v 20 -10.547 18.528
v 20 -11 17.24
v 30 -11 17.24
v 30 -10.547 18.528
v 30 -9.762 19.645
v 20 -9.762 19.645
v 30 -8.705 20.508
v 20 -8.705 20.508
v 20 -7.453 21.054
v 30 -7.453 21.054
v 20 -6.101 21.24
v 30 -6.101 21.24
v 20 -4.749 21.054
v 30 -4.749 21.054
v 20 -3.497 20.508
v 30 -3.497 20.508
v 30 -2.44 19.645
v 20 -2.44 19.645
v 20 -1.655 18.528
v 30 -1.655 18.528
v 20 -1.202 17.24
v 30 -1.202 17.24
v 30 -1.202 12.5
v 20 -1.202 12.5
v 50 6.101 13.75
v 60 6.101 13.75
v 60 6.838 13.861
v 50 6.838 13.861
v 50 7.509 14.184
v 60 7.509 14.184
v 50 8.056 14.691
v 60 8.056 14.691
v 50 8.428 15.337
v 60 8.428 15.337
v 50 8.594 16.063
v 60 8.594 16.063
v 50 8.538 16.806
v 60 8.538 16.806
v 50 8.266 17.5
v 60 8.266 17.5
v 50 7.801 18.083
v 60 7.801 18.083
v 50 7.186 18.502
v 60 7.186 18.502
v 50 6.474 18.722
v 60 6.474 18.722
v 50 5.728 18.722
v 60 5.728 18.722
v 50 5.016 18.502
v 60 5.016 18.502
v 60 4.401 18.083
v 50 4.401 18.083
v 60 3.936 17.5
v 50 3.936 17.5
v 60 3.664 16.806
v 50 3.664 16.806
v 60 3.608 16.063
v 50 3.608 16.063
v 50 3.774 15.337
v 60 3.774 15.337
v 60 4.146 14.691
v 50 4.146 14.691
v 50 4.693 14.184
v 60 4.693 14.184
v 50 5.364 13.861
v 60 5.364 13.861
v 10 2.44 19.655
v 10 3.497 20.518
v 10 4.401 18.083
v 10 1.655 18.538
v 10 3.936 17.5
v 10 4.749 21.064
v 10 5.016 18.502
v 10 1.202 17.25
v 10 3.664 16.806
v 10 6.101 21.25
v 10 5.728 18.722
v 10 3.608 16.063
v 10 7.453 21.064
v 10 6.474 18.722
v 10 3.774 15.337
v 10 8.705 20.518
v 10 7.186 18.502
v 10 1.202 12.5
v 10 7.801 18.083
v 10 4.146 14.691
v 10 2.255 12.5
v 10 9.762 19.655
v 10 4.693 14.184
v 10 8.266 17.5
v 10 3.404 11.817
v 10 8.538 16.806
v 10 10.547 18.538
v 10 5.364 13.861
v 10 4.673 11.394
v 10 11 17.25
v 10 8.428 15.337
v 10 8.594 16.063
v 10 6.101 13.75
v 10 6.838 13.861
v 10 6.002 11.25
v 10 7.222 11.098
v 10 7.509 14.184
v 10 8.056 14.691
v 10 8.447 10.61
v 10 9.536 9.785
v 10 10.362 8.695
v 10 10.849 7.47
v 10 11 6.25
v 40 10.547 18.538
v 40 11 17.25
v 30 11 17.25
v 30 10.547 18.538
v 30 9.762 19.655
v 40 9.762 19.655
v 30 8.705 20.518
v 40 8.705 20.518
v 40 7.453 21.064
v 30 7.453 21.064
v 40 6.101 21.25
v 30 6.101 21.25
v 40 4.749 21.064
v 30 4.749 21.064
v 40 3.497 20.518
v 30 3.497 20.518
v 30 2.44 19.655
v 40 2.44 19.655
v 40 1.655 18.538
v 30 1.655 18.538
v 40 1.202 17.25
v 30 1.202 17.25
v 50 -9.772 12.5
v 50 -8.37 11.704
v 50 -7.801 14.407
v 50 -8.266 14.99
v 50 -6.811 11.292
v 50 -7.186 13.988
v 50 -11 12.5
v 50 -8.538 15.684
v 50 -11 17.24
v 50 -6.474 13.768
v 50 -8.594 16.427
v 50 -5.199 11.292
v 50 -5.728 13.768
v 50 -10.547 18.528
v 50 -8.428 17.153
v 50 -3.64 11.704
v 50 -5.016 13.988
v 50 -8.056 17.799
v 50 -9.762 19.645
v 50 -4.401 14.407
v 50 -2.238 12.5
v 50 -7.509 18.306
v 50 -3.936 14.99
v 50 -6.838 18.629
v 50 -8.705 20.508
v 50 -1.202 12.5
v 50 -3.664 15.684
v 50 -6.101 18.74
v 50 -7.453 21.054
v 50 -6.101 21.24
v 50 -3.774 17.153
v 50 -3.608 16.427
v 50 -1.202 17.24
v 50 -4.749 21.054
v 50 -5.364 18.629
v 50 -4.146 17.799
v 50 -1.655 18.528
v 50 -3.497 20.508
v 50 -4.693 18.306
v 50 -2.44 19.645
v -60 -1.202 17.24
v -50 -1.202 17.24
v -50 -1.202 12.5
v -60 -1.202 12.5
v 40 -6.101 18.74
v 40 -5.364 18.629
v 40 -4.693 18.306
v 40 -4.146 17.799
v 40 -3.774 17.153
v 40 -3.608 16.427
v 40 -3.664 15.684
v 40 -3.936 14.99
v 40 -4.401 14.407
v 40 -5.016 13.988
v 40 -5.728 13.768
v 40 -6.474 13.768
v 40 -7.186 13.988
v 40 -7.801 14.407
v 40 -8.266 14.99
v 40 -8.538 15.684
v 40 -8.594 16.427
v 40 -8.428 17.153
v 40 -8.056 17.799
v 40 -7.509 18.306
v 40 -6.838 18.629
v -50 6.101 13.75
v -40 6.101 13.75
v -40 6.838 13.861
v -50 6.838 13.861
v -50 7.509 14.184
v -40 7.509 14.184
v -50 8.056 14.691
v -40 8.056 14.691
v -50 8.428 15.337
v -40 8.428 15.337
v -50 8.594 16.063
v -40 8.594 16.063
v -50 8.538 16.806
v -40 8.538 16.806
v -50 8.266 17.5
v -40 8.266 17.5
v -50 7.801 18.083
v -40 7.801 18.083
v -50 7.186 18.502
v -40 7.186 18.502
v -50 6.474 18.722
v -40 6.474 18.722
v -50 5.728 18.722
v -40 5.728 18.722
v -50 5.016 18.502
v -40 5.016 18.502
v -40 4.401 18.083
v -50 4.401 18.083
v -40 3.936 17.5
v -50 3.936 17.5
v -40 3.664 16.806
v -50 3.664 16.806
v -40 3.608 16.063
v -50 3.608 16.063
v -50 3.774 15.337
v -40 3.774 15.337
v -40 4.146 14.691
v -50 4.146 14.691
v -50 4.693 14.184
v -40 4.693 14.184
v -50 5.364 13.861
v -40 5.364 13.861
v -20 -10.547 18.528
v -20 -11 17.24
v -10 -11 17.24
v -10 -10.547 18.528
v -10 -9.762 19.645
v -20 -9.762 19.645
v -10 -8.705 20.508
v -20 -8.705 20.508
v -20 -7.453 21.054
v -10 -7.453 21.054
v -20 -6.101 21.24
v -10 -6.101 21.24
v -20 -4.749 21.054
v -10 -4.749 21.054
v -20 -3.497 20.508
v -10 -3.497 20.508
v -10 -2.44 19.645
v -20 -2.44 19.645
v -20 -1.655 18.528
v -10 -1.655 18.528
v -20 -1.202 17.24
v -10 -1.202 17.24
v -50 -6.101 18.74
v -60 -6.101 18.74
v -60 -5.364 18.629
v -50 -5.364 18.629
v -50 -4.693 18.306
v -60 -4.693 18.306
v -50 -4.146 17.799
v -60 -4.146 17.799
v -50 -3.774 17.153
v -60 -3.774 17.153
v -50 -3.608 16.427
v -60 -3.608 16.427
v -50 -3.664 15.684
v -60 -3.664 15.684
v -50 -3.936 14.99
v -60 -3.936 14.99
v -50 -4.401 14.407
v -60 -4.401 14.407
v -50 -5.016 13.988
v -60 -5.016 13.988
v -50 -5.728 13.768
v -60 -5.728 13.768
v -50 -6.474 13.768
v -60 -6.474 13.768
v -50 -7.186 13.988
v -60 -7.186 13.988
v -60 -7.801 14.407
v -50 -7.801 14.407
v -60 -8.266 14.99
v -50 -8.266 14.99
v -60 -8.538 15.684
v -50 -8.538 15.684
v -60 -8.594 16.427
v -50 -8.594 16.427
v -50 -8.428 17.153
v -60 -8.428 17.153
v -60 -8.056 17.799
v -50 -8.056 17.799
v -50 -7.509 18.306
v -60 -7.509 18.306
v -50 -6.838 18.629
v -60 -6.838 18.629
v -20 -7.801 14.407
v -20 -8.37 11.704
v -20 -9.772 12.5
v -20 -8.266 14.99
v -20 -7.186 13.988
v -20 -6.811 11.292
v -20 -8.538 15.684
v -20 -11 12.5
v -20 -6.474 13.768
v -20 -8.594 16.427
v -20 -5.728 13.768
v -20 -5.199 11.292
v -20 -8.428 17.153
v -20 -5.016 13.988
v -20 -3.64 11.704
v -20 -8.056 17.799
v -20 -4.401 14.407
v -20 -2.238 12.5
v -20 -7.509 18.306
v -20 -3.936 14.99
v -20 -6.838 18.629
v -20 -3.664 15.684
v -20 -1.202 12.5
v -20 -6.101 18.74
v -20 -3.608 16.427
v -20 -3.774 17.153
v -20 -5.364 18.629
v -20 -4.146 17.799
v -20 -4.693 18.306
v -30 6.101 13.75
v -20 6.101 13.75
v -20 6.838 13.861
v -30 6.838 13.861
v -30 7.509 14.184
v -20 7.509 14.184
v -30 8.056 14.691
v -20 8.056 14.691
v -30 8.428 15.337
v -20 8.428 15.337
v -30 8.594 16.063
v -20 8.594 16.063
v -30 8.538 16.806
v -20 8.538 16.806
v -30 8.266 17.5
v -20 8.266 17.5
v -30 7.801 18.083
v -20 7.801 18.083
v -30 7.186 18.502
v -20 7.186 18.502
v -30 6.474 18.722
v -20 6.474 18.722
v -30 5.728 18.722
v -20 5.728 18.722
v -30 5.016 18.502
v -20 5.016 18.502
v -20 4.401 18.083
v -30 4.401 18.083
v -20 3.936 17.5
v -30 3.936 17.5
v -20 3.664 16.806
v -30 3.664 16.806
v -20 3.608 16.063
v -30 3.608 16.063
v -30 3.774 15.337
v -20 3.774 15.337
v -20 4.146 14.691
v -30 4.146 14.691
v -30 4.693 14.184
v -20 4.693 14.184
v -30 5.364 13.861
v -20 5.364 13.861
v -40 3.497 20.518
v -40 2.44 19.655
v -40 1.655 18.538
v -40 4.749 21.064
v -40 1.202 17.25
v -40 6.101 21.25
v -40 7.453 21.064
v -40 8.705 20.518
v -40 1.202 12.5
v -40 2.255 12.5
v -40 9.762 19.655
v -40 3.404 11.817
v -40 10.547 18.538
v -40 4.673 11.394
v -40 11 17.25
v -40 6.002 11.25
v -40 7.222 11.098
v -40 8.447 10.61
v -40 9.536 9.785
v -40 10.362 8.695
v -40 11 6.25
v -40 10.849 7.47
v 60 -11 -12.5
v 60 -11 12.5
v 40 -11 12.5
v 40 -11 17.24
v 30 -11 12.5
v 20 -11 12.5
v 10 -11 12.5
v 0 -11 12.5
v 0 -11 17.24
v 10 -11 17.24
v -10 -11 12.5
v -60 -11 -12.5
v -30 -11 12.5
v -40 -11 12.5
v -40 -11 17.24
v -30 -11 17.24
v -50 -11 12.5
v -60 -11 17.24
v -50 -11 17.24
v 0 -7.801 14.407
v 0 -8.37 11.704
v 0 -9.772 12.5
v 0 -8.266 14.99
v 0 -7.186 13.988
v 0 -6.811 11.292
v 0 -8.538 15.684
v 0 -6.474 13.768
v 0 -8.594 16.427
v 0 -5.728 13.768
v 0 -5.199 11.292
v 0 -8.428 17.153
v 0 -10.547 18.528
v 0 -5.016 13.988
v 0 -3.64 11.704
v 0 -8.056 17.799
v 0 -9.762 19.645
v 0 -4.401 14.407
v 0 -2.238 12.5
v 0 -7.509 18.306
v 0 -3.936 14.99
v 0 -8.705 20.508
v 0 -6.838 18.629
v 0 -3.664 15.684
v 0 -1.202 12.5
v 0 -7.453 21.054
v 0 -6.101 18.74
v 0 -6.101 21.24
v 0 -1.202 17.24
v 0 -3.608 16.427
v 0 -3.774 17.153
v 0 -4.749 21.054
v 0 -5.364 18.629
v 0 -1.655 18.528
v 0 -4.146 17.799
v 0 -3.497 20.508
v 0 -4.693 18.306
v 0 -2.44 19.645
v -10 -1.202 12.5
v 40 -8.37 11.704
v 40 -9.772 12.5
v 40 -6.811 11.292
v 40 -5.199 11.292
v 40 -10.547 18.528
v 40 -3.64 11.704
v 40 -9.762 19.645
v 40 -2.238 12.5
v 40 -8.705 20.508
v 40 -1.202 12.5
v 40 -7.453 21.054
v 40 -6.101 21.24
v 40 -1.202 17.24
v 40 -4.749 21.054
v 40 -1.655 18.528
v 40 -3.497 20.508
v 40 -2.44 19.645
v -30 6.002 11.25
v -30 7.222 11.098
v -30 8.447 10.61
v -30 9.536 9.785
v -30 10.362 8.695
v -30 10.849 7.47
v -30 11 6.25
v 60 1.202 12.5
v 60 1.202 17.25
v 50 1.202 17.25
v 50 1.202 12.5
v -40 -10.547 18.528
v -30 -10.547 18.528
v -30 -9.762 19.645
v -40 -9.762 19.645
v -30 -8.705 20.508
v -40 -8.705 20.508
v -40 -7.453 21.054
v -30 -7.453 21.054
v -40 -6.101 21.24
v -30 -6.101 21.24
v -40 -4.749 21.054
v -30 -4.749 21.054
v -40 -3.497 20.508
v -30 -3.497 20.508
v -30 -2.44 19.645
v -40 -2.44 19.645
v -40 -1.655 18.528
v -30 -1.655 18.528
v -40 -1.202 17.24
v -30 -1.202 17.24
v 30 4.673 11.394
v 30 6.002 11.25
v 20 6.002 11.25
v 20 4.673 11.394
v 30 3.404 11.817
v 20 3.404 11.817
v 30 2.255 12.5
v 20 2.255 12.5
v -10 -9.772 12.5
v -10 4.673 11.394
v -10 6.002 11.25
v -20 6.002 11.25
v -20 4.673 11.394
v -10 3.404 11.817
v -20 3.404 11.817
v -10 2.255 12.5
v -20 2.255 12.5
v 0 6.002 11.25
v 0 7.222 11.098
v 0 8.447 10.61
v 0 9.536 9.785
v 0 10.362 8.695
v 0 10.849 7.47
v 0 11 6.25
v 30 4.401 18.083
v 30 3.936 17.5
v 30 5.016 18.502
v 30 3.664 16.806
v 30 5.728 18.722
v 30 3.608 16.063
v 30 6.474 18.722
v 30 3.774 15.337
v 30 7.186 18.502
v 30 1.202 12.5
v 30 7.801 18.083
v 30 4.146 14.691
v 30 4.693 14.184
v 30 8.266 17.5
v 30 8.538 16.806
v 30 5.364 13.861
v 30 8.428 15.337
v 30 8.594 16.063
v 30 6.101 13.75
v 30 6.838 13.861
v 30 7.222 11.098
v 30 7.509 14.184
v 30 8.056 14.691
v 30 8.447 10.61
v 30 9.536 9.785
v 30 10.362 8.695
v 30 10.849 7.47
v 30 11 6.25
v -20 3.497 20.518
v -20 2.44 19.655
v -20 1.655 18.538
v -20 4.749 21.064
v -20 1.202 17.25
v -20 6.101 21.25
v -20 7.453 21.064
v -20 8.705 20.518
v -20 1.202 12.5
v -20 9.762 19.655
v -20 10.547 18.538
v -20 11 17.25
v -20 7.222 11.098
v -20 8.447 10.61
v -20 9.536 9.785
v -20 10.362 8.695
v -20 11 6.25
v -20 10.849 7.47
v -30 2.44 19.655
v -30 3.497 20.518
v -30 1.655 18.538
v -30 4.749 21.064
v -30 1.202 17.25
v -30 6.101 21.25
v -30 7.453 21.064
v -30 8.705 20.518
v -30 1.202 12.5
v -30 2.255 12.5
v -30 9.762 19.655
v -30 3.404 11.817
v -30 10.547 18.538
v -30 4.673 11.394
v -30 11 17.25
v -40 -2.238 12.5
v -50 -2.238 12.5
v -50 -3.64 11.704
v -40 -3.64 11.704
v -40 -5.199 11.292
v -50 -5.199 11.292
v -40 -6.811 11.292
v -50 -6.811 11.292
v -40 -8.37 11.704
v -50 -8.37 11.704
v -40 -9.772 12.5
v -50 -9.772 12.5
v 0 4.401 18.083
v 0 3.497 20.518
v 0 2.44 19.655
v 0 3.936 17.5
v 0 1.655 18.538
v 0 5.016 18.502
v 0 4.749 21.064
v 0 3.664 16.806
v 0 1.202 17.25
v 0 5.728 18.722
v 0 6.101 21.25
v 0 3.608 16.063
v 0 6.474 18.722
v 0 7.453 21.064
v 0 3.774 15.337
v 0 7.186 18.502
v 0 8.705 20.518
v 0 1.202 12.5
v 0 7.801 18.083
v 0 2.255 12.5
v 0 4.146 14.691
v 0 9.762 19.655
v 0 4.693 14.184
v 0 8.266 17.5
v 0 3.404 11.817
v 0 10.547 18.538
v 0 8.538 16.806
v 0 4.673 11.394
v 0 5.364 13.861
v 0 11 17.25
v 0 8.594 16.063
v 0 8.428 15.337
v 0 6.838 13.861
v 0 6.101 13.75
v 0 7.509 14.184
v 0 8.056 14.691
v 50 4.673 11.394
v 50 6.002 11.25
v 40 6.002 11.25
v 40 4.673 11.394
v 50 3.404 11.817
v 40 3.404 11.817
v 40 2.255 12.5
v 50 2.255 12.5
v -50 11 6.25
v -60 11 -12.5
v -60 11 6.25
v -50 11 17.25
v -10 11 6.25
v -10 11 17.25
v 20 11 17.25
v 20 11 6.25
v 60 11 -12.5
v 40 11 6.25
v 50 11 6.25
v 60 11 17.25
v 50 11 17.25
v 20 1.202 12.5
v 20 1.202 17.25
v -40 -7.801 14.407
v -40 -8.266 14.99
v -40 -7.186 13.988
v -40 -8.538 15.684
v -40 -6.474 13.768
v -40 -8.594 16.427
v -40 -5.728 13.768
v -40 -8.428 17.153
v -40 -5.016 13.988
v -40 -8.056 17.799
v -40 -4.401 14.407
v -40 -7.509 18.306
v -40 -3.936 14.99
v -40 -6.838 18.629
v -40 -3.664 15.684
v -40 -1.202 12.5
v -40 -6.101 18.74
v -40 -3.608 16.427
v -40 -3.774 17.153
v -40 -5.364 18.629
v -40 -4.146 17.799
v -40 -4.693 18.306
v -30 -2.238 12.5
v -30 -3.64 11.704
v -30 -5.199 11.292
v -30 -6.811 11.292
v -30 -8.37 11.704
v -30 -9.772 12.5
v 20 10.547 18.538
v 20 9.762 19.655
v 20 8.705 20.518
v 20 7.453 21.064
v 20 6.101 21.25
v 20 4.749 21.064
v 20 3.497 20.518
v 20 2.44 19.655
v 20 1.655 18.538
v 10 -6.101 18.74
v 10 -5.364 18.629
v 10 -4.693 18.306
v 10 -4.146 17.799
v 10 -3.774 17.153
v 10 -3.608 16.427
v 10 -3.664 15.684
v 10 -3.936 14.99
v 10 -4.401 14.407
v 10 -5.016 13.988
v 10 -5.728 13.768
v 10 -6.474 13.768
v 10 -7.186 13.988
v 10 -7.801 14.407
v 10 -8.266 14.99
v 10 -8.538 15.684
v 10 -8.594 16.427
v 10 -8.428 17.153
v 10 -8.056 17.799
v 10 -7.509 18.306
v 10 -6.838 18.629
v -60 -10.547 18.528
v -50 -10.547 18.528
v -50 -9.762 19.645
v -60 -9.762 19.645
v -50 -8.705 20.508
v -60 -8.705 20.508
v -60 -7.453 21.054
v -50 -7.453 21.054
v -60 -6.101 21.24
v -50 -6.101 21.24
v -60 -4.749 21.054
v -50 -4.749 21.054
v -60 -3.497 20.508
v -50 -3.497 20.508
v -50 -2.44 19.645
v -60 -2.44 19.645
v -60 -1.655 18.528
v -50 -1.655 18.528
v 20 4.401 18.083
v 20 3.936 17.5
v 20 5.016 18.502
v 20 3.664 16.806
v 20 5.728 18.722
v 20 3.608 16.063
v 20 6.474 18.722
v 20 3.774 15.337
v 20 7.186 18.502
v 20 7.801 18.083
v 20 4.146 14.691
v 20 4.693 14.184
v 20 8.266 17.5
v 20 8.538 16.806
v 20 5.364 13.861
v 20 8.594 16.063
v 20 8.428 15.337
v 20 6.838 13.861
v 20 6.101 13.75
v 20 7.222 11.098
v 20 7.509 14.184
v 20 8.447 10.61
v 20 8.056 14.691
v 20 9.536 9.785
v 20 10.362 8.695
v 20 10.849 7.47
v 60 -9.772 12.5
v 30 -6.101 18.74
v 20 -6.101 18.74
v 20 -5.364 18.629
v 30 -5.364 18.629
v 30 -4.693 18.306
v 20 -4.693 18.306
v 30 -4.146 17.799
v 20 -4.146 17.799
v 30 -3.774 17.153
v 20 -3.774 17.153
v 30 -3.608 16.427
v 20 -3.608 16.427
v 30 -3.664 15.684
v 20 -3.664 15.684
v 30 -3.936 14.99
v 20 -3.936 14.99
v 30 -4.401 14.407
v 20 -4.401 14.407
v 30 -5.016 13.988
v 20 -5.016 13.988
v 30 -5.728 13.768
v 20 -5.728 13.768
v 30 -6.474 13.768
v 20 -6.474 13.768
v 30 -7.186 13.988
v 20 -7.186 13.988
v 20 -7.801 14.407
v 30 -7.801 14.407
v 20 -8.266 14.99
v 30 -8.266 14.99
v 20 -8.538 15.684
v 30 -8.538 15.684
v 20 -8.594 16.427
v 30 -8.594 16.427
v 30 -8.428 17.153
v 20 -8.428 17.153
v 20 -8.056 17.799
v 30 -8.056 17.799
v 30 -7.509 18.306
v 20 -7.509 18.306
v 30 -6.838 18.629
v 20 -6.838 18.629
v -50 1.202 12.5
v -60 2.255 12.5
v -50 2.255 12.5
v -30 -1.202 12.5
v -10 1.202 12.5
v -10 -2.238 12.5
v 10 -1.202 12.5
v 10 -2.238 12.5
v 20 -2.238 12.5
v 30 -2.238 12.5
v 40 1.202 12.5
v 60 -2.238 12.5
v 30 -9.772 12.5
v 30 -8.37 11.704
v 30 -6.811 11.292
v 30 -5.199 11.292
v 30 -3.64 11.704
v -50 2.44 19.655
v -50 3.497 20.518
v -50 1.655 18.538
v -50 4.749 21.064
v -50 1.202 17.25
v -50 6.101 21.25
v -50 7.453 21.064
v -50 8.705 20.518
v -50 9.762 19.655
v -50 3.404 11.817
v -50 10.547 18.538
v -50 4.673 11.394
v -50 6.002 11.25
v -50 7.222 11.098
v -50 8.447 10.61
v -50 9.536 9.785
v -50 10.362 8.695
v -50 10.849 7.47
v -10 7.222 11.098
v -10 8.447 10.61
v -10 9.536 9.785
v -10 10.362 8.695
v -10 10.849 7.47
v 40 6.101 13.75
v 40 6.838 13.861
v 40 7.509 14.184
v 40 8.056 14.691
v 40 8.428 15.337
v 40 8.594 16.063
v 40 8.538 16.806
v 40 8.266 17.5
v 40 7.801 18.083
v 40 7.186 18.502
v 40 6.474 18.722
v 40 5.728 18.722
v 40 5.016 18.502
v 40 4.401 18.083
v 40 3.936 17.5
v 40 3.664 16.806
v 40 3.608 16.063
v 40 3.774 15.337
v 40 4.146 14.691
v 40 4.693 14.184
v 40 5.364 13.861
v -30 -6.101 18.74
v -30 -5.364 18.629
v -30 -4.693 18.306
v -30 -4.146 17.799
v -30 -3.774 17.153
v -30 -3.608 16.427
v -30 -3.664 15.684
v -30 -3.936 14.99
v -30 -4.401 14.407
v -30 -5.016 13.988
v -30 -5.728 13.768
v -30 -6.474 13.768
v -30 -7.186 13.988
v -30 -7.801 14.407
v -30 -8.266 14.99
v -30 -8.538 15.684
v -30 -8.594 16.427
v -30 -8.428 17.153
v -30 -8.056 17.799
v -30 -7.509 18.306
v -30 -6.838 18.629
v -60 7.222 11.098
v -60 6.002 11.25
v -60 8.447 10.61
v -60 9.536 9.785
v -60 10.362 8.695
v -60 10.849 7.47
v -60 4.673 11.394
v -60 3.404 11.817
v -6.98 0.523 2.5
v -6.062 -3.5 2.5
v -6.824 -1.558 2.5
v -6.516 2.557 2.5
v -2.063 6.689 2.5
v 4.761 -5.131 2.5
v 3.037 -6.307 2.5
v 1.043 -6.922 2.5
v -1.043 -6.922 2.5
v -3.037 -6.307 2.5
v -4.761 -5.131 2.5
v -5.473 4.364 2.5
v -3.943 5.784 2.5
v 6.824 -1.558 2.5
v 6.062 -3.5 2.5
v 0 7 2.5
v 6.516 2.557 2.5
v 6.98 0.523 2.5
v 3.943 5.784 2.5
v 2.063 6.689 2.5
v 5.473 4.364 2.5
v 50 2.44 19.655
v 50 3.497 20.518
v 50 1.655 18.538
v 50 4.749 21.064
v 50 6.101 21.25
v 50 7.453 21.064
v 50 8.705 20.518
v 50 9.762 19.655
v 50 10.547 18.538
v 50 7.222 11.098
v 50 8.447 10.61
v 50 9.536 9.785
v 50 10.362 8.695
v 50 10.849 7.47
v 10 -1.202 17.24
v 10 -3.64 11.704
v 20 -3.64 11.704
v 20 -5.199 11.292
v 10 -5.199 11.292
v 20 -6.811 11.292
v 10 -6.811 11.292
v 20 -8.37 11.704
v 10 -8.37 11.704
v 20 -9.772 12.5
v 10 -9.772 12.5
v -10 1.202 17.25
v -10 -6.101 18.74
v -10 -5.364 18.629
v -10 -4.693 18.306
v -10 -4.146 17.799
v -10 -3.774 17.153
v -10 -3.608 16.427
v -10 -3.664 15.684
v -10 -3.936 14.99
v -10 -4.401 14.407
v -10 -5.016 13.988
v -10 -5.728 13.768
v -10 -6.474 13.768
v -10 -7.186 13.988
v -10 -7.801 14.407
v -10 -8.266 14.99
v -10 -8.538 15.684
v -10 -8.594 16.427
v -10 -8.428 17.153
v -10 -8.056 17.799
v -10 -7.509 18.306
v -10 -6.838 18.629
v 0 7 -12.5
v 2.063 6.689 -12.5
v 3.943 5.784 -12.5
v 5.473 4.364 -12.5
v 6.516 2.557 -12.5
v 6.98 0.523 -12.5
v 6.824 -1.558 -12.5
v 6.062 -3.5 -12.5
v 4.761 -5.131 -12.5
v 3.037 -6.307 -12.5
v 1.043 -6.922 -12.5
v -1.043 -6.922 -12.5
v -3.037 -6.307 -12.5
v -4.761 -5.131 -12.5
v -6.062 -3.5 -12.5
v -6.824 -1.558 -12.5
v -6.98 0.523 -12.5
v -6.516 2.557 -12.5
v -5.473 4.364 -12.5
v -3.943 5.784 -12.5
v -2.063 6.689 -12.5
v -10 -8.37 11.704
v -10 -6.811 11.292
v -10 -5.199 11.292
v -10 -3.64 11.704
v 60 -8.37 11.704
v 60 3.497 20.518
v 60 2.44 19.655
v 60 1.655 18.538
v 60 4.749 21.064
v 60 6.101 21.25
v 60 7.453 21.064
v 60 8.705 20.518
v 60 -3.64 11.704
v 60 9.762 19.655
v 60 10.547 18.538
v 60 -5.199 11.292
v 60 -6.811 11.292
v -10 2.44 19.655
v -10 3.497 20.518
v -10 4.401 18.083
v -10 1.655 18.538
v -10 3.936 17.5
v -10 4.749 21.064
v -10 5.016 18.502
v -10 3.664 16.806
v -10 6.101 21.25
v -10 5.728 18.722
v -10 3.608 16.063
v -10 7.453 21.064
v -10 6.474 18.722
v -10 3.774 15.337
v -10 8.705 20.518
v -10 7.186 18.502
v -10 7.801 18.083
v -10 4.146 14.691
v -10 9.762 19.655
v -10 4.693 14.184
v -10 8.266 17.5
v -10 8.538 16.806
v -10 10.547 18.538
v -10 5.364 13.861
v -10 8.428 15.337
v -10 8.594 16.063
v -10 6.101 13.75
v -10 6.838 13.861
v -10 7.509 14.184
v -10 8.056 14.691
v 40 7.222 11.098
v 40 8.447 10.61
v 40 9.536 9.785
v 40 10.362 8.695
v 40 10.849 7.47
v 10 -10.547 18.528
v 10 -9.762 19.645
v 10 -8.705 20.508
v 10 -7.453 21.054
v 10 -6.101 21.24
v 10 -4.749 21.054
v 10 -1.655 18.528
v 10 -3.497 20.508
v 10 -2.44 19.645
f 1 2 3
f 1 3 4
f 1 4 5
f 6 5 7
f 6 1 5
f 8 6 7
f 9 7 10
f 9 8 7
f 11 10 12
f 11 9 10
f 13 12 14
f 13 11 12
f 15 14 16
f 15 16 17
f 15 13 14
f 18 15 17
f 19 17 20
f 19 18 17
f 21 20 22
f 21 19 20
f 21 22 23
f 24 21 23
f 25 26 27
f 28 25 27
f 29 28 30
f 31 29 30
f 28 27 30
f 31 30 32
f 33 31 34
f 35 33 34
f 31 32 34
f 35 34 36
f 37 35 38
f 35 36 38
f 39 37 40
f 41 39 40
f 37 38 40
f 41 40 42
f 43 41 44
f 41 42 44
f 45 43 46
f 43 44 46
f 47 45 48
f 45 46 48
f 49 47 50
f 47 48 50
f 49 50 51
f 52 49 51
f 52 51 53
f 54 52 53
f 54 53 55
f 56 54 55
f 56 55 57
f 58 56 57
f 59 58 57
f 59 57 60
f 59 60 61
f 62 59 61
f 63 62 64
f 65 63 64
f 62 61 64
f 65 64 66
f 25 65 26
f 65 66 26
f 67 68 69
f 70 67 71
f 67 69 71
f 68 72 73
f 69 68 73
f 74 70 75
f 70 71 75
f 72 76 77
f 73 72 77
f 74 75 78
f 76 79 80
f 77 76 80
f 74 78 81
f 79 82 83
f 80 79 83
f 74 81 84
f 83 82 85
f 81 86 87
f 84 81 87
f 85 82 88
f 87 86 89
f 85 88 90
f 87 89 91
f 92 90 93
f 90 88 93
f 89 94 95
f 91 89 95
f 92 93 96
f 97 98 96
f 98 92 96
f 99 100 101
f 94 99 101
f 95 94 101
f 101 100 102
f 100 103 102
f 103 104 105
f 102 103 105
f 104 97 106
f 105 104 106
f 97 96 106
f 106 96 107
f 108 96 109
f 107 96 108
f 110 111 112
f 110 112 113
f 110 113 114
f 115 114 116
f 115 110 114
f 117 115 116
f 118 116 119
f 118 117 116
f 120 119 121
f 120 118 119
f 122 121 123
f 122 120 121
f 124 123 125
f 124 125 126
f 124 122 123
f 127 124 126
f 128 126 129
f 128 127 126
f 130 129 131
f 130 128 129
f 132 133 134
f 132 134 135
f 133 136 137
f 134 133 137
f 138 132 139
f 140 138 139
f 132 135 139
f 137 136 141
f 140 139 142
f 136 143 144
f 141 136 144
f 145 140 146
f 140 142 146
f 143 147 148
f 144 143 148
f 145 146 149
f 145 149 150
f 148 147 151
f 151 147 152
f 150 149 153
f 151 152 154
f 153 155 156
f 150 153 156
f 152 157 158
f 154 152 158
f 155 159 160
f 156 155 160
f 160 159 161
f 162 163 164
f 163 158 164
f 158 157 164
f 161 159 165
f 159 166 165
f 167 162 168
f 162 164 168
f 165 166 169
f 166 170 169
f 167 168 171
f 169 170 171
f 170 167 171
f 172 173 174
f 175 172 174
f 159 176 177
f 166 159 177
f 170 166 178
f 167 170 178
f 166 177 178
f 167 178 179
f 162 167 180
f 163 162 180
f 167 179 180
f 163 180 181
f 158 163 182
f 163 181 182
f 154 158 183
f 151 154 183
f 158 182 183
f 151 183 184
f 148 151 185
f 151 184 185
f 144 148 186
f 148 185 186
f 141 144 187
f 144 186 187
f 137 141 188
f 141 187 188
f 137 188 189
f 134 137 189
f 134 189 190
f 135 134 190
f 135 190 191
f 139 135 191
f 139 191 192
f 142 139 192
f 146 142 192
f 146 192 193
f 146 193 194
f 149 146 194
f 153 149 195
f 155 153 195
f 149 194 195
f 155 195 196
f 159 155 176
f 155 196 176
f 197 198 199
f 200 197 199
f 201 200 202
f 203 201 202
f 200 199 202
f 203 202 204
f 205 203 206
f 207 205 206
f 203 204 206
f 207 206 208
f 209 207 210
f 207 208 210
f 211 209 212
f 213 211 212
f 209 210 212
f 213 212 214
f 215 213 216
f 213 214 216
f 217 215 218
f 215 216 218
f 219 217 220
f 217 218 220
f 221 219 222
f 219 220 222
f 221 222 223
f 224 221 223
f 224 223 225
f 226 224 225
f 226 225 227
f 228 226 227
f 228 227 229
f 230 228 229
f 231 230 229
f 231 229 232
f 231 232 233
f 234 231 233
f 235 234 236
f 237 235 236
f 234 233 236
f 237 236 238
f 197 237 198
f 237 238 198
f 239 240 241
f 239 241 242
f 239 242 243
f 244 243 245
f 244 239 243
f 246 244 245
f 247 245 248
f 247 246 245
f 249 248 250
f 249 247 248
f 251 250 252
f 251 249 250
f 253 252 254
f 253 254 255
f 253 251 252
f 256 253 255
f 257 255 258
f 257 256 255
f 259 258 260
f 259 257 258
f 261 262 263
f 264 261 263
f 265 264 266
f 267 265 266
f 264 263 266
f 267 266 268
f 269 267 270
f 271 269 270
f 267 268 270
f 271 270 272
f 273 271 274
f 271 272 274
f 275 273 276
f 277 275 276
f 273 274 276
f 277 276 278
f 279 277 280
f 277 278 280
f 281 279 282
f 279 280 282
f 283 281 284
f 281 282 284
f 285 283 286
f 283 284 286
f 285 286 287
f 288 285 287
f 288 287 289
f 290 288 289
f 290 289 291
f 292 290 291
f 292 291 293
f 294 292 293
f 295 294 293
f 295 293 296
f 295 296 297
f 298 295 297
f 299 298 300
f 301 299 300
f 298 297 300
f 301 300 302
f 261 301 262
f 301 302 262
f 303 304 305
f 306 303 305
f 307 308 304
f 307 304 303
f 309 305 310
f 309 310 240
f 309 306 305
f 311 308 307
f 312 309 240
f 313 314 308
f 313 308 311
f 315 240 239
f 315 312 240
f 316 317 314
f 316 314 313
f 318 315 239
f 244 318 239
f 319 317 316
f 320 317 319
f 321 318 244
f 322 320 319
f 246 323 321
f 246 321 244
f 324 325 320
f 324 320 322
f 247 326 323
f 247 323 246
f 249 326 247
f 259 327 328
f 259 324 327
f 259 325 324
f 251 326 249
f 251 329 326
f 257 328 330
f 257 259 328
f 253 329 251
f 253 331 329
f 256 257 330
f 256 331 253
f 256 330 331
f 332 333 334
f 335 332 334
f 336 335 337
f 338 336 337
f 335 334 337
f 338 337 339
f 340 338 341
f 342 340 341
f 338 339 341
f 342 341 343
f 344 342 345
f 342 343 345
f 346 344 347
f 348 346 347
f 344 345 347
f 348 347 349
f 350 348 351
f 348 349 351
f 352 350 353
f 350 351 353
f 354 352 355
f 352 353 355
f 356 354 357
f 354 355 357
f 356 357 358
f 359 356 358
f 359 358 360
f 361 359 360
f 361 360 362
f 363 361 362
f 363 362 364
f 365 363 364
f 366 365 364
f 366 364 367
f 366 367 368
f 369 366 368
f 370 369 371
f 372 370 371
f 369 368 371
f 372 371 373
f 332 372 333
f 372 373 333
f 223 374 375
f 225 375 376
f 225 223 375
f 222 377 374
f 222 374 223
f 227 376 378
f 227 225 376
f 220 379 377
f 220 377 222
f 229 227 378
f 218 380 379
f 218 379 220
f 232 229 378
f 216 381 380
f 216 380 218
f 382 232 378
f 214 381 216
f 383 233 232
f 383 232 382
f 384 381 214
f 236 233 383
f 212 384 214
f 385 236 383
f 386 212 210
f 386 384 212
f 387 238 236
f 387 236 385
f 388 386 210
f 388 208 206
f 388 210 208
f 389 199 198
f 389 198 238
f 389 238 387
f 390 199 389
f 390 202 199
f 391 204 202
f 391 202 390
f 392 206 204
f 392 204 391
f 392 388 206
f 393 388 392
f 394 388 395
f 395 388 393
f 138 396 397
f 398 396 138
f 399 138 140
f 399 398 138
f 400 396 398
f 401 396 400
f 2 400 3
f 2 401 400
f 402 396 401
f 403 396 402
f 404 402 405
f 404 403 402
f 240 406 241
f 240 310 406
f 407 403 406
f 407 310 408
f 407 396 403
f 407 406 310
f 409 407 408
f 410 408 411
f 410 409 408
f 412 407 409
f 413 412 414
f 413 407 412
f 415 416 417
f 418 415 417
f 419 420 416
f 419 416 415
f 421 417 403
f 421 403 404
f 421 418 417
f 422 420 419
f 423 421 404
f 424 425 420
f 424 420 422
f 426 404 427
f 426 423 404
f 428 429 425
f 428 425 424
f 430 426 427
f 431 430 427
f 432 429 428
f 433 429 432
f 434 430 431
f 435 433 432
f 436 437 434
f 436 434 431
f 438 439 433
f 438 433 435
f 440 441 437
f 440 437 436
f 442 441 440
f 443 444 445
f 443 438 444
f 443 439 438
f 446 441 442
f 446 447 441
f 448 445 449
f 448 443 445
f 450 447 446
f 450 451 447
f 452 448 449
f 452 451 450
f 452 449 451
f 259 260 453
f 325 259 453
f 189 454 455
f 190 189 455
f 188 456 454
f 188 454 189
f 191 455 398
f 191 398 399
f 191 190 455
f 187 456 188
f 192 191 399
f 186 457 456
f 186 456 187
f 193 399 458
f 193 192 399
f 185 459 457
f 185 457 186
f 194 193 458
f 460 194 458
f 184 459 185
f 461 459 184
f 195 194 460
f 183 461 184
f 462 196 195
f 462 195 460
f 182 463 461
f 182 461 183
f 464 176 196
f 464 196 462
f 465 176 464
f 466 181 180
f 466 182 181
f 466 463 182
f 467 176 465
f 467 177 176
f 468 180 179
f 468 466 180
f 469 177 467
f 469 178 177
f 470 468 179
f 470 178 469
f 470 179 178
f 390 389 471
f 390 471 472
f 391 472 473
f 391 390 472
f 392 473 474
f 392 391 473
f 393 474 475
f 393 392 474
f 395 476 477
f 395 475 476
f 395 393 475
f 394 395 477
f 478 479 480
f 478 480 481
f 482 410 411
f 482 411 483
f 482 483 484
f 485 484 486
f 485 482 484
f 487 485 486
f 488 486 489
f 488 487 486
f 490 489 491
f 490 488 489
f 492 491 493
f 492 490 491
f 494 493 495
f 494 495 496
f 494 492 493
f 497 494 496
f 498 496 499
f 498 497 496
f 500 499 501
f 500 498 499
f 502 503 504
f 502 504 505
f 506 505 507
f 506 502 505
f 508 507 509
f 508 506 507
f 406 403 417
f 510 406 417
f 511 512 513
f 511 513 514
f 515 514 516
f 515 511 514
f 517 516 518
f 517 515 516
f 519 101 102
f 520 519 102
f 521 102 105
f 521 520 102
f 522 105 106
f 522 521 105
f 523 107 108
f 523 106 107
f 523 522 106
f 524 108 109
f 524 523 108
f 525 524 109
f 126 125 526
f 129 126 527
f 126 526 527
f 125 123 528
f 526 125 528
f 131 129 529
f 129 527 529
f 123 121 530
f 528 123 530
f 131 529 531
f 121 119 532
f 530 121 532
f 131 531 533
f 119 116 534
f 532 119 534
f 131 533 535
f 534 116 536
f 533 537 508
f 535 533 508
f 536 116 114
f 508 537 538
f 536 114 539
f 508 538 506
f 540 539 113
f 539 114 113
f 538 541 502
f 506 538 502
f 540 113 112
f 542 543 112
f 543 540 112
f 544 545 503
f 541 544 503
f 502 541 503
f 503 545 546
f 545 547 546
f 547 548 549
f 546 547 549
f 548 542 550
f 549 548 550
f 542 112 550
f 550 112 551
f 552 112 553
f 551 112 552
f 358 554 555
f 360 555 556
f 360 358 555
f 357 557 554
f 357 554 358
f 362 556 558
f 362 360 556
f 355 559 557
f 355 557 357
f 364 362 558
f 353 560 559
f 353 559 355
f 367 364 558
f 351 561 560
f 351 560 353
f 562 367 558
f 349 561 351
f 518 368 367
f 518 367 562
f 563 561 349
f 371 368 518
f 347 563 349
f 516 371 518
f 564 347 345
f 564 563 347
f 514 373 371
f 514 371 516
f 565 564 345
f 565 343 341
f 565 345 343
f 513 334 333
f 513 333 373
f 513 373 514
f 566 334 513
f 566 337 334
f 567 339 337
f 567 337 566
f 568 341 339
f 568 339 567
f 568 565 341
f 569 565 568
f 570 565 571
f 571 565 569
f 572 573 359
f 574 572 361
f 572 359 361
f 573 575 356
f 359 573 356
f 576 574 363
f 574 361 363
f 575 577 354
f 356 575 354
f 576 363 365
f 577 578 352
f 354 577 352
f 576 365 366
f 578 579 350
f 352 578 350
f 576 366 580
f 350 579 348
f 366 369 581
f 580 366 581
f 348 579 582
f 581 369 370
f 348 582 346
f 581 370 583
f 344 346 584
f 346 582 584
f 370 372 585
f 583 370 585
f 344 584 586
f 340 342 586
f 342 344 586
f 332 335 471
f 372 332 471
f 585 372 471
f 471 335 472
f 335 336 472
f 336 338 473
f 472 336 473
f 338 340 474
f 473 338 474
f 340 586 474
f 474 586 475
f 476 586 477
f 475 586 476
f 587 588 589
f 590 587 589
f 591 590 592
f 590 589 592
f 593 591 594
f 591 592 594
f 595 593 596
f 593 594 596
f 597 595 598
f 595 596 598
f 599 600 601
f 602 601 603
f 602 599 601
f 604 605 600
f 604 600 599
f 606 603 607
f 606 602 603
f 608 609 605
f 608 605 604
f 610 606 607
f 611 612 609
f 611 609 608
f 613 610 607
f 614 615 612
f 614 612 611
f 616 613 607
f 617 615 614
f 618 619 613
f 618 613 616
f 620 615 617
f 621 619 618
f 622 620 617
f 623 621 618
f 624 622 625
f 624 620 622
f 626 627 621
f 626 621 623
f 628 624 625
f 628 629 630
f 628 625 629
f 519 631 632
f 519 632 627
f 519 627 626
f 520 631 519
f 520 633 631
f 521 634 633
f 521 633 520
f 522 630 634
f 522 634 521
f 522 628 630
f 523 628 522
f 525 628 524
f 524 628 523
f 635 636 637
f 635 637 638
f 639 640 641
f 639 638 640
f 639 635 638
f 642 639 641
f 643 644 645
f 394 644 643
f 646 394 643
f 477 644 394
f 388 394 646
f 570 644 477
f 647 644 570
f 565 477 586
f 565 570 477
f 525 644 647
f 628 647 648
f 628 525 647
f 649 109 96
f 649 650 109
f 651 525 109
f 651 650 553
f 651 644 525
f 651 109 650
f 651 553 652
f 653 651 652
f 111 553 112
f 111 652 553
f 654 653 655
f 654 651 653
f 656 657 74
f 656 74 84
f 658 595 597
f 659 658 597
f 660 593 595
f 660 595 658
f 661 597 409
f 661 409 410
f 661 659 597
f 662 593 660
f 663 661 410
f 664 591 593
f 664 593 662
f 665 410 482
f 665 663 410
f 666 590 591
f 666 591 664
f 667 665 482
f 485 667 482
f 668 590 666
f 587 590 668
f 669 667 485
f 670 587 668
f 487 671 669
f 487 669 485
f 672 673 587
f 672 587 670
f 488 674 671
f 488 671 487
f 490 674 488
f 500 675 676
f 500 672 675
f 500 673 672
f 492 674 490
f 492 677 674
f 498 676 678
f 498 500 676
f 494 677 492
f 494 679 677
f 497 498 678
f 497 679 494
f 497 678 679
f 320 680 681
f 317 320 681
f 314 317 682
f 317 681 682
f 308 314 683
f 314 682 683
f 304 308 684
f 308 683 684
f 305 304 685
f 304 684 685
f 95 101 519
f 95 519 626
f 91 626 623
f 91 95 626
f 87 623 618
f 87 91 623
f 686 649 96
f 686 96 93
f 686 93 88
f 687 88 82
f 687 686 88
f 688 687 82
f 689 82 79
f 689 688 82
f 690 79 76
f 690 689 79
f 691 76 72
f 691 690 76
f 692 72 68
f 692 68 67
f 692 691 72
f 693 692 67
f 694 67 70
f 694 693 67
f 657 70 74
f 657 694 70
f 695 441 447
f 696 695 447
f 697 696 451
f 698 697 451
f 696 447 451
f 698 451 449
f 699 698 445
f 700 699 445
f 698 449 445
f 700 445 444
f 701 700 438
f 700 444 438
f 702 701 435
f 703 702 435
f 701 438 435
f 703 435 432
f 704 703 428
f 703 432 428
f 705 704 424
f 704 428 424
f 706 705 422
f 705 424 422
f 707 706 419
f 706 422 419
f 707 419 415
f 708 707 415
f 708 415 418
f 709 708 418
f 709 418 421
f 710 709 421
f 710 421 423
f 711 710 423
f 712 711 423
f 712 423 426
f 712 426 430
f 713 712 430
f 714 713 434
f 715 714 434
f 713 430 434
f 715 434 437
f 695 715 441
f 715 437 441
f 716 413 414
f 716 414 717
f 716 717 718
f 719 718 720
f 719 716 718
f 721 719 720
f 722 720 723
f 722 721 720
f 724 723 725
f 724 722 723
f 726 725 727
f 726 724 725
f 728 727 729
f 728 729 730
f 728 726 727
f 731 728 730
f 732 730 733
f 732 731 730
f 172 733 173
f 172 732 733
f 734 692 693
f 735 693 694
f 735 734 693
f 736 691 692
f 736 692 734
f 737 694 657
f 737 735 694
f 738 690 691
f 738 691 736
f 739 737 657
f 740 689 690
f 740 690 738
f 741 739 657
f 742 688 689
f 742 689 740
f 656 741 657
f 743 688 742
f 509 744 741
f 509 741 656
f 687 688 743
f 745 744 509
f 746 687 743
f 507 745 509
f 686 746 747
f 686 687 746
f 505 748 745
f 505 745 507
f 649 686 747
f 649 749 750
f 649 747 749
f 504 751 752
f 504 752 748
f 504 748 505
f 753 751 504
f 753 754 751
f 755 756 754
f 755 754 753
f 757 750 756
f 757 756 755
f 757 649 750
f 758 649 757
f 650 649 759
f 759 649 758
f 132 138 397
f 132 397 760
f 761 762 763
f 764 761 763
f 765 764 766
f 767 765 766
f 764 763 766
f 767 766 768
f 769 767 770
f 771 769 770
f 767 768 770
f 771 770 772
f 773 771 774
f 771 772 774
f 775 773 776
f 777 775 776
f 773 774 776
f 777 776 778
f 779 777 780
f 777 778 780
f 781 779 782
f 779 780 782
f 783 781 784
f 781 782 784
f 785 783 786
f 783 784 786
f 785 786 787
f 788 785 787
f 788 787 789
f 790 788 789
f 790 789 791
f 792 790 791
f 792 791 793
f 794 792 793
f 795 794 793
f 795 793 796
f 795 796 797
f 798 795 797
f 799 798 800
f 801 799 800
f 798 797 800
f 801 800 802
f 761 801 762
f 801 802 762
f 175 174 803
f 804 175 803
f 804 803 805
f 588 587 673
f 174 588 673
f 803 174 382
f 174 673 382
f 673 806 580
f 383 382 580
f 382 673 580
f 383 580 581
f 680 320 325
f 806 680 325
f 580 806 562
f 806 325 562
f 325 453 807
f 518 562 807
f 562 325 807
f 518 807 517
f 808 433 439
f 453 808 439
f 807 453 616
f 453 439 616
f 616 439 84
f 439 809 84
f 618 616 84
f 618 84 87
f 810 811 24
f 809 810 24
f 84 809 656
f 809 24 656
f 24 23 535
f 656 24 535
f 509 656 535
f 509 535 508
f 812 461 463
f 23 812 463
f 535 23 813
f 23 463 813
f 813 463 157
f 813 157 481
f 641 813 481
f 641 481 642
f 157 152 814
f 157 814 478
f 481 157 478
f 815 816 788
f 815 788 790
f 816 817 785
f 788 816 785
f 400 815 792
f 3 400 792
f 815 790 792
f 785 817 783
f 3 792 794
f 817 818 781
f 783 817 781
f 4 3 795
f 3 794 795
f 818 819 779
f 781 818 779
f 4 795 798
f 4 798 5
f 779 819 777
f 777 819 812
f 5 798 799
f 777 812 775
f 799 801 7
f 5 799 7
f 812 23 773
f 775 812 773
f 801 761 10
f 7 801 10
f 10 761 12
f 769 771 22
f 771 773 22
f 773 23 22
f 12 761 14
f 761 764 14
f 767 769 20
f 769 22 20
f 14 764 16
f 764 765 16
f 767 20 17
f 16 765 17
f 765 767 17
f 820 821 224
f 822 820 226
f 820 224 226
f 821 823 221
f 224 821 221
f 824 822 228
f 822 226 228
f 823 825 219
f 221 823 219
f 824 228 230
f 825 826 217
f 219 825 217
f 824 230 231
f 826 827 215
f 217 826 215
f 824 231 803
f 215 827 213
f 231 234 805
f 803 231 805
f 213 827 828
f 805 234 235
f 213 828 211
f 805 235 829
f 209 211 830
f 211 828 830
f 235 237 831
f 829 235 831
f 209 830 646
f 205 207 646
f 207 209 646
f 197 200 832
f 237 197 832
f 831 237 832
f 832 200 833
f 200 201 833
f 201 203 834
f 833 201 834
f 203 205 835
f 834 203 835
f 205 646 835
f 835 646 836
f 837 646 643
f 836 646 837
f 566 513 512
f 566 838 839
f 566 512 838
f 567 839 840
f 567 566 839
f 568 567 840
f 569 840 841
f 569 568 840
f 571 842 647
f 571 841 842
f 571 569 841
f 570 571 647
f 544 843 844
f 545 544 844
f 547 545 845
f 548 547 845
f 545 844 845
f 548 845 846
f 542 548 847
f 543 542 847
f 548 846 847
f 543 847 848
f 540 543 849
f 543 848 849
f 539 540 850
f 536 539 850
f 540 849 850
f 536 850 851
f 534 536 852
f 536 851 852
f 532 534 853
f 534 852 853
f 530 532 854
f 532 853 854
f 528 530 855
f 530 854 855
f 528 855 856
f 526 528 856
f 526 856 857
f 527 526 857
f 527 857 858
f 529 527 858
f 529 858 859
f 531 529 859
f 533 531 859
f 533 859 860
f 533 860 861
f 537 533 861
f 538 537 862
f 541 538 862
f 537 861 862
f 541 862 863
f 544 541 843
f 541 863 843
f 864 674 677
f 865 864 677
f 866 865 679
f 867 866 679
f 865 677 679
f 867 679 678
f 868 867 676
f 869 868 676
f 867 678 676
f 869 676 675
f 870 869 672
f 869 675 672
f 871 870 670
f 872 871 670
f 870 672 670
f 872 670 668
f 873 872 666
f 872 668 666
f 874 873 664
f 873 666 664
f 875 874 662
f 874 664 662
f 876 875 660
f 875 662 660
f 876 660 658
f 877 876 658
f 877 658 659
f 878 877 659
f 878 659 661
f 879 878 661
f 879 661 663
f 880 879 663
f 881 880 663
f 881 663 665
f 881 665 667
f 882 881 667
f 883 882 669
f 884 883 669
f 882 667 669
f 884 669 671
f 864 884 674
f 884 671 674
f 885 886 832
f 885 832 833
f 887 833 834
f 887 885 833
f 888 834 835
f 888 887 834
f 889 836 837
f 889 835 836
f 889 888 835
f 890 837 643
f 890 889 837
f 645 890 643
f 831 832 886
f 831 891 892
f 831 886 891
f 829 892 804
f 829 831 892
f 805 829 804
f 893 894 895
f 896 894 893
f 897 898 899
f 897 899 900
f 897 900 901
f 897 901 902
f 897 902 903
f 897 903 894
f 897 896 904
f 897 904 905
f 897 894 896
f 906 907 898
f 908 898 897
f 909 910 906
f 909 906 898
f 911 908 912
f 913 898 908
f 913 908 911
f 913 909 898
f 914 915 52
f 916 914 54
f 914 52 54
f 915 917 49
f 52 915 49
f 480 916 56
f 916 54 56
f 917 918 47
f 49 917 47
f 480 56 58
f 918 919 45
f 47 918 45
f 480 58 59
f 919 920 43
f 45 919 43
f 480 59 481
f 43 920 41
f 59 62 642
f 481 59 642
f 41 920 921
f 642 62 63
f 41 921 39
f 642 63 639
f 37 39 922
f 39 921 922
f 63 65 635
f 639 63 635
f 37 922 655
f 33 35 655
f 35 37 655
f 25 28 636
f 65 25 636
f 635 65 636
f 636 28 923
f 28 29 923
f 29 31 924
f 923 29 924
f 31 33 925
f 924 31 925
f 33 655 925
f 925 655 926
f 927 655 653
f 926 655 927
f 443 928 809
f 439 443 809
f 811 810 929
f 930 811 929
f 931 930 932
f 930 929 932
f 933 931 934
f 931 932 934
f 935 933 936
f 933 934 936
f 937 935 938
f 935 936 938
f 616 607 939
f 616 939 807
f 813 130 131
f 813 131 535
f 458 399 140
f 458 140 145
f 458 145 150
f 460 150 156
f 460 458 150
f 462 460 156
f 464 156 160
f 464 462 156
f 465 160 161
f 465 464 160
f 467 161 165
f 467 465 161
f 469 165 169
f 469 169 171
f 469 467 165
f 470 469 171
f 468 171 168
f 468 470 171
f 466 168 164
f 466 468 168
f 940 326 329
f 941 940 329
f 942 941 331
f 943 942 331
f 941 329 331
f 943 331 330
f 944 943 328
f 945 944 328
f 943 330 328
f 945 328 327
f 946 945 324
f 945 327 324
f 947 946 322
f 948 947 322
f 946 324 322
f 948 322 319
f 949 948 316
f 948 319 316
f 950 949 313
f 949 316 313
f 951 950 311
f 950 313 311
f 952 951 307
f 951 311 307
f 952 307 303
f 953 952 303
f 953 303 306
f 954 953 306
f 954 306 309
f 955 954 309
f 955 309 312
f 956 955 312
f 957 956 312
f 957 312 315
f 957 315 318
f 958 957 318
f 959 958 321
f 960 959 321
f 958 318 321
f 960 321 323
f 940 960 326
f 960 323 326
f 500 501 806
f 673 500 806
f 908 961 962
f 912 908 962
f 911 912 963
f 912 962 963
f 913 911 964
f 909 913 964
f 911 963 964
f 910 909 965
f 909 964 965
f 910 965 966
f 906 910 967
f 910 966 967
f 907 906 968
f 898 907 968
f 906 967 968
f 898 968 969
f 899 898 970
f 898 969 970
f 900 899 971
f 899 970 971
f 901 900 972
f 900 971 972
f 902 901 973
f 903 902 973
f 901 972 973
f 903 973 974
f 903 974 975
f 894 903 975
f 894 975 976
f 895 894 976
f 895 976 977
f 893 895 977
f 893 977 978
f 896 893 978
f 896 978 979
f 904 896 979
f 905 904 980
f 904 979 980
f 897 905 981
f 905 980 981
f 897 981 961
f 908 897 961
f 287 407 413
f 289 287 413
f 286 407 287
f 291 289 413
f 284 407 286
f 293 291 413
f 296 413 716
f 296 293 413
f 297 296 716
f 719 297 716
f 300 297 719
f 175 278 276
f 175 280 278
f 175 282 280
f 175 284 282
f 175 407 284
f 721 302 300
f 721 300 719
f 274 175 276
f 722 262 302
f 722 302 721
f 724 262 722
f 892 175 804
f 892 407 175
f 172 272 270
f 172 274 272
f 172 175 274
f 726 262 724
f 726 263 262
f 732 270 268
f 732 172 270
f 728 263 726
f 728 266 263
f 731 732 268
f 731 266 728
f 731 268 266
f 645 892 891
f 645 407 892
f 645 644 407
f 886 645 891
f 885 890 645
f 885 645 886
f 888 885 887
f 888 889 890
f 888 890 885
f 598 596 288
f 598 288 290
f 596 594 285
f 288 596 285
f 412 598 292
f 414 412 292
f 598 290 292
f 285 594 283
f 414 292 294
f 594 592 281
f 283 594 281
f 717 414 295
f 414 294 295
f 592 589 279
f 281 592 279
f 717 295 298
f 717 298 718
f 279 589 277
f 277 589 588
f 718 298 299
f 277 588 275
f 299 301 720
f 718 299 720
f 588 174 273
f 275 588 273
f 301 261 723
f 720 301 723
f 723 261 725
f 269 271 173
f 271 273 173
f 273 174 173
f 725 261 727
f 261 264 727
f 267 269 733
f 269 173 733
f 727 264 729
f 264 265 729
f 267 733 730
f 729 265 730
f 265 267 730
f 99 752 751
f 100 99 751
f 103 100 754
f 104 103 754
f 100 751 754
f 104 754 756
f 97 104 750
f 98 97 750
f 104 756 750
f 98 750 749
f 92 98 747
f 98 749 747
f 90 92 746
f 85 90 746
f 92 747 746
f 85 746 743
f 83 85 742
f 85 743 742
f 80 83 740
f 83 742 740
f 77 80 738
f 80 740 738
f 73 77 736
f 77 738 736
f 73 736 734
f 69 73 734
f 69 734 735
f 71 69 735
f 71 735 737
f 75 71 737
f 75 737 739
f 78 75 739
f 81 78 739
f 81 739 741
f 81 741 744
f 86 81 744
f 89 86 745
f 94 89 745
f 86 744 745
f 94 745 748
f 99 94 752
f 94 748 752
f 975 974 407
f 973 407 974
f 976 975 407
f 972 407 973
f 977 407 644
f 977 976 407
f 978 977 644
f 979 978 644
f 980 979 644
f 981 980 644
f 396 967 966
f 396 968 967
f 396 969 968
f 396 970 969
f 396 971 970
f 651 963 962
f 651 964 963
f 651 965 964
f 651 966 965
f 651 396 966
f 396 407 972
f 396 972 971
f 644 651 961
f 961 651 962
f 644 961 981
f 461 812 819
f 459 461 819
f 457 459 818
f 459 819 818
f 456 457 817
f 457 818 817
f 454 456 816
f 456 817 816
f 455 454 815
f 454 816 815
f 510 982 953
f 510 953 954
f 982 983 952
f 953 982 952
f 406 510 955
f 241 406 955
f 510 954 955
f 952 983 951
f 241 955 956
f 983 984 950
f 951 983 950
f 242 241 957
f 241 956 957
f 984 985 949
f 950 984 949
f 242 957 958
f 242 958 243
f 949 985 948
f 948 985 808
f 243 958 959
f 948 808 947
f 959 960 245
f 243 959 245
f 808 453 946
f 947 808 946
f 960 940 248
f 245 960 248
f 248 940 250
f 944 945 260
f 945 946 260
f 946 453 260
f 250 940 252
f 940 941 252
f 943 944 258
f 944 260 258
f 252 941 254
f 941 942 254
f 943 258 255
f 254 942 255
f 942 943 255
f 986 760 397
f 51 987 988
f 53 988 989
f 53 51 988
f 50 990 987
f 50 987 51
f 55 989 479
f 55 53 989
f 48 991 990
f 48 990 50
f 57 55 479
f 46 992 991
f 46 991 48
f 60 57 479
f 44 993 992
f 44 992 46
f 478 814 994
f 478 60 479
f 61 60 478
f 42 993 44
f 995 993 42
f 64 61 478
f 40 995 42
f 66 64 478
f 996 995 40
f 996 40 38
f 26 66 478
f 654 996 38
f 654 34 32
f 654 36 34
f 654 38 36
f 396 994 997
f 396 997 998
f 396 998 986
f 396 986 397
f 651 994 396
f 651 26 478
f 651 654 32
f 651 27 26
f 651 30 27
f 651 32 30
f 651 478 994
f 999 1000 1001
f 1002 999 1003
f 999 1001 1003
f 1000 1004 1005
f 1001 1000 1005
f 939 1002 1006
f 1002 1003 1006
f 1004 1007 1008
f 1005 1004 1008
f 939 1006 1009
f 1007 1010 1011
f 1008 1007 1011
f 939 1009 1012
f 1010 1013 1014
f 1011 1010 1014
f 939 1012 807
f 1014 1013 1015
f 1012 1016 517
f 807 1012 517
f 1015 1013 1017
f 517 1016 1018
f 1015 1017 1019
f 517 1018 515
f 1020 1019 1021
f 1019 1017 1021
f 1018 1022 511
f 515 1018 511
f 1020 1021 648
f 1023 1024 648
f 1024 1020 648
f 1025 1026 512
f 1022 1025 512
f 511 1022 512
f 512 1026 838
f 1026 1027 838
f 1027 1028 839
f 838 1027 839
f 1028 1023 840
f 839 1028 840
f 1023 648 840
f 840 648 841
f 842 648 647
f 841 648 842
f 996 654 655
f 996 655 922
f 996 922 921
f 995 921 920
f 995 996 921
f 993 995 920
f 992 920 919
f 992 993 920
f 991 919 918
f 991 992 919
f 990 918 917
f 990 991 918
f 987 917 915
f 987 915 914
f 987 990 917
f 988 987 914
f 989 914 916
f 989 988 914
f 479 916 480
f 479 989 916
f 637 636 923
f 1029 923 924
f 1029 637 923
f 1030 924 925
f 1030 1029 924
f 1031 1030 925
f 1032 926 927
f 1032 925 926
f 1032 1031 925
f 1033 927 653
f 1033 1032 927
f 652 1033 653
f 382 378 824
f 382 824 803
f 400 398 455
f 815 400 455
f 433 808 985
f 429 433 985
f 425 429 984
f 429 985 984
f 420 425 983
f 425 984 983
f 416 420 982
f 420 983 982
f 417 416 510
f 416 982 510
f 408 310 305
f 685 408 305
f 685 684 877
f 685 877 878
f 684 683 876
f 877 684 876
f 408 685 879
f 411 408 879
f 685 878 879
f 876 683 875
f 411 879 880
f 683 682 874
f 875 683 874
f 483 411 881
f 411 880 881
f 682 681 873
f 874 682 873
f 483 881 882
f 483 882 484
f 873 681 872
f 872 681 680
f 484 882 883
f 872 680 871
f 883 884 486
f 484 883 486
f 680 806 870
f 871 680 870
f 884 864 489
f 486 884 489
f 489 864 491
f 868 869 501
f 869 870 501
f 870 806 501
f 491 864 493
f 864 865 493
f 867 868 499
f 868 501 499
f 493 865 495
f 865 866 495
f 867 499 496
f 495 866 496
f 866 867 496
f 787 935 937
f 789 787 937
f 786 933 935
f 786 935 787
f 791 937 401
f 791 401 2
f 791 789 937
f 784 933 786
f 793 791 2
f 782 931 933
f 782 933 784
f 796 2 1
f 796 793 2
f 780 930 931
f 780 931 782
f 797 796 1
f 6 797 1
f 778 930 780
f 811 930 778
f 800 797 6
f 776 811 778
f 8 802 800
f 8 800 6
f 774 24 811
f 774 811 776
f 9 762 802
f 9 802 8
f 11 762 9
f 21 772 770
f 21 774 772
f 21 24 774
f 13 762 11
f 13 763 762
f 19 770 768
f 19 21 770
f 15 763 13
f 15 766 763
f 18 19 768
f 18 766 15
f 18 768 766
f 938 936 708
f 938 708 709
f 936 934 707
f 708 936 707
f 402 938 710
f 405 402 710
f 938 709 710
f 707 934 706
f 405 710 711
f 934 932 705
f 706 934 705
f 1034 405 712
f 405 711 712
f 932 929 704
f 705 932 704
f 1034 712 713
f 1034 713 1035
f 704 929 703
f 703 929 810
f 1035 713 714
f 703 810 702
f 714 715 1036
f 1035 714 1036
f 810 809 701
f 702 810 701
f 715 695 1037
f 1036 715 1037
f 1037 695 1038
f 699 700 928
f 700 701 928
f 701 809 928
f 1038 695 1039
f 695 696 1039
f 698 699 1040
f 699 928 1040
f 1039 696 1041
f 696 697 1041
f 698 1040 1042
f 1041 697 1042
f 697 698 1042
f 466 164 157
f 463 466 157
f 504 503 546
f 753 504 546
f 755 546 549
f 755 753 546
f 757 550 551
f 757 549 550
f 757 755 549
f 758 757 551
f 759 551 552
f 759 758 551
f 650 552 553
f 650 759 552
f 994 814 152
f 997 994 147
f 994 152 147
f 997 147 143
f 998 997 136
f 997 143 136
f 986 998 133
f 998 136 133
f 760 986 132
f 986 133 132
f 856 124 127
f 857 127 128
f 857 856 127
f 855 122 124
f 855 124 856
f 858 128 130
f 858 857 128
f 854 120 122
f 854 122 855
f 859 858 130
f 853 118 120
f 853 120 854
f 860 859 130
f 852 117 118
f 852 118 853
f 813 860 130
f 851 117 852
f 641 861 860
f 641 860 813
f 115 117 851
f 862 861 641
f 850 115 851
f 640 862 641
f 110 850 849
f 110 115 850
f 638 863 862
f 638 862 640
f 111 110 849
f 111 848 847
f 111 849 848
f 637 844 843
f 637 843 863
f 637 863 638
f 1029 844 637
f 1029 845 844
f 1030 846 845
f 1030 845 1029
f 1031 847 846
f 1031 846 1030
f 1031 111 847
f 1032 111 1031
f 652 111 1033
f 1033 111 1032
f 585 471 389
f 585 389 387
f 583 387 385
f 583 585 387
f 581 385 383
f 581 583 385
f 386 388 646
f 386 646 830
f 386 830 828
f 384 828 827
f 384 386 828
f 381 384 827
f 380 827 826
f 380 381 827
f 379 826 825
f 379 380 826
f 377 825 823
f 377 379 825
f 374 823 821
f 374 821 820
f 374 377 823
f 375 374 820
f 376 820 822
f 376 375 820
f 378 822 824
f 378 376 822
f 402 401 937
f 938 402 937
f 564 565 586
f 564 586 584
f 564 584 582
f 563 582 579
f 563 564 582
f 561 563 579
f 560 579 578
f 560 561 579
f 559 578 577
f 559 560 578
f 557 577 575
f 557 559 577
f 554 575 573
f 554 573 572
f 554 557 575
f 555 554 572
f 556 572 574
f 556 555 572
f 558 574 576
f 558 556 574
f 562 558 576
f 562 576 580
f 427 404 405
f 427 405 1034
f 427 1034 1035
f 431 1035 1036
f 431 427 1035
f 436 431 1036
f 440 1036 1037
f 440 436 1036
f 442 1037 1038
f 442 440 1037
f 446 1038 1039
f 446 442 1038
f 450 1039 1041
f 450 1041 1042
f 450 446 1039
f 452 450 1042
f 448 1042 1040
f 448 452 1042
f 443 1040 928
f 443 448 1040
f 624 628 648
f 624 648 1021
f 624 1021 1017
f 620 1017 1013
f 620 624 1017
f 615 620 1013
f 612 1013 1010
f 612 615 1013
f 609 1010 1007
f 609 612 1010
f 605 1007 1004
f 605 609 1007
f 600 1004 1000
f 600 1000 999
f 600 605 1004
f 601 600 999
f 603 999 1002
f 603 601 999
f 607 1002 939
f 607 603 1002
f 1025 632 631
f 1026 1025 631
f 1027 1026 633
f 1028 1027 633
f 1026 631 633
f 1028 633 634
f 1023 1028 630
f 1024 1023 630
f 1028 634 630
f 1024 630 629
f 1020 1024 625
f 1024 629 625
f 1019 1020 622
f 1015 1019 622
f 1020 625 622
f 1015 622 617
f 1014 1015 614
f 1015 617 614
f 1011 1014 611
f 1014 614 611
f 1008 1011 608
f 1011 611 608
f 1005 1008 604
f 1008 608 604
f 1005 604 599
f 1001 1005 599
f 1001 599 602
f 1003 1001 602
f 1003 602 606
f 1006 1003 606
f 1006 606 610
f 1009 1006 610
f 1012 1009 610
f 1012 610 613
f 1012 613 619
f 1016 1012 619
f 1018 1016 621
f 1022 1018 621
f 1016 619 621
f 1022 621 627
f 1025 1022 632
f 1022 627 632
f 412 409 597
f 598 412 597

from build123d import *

# Parameters (mm, degrees)
SKETCH1_W           = 25
SKETCH1_H           = 22
BOSS_EXTRUDE1_DEPTH = 60
CUT_EXTRUDE2_REACH  = 123.15
CUT_EXTRUDE3_REACH  = 123.15
SKETCH6_R           = 6.26
FILLET1_R           = 5
SKETCH2_R           = 2.5
BOSS_EXTRUDE2_DEPTH = 10
LPATTERN1_COUNT     = 6
LPATTERN1_PITCH     = 20
SKETCH3_R           = 2.5
BOSS_EXTRUDE3_DEPTH = 10
LPATTERN2_COUNT     = 6
LPATTERN2_PITCH     = 20
SKETCH4_R           = 7
CUT_EXTRUDE1_DEPTH  = 15


with BuildPart() as part:
    # Sketch1 → Boss-Extrude1 (new, symmetric)
    with BuildSketch(Plane(origin=(0, 0, 0), x_dir=(0, 0, -1), z_dir=(1, 0, 0))):
        Rectangle(SKETCH1_W, SKETCH1_H)
    extrude(amount=BOSS_EXTRUDE1_DEPTH, both=True)

    # Sketch5 → Cut-Extrude2 (cut, up to next)
    with BuildSketch(Plane(origin=(60, 0, 0), x_dir=(0, 0, -1), z_dir=(1, 0, 0)), mode=Mode.PRIVATE) as cut_extrude2_sk1:
        with BuildLine():
            Line((-13.743342576, 11), (-11.25, 11))
            Line((-11.25, 11), (-11.25, 6.005))
            ThreePointArc((-11.25, 6.005), (-23.092030441, 3.213639122), (-13.743342576, 11))
        make_face()
    cut_extrude2_tool1 = extrude(cut_extrude2_sk1.sketch, amount=-CUT_EXTRUDE2_REACH, mode=Mode.PRIVATE) & part.part
    add(cut_extrude2_tool1.solids().sort_by_distance((60, 6.117758, 17.335764))[0], mode=Mode.SUBTRACT)

    # Sketch6 → Cut-Extrude3 (cut, up to next)
    with BuildSketch(Plane.ZY.offset(60), mode=Mode.PRIVATE) as cut_extrude3_sk1:
        with Locations((17.5, -6.005)):
            Circle(SKETCH6_R)
    cut_extrude3_tool1 = extrude(cut_extrude3_sk1.sketch, amount=-CUT_EXTRUDE3_REACH, mode=Mode.PRIVATE) & part.part
    add(cut_extrude3_tool1.solids().sort_by_distance((-60, -6.005, 17.5))[0], mode=Mode.SUBTRACT)

    # Fillet1
    fillet1_edges = [part.edges().sort_by_distance(p)[0] for p in [
        (0, 11, 11.25),
    ]]
    fillet(fillet1_edges, radius=FILLET1_R)

    # Sketch2 → Boss-Extrude2 (add)
    with BuildSketch(Plane(origin=(60, 0, 0), x_dir=(0, 0, -1), z_dir=(1, 0, 0))):
        with BuildLine():
            Line((-17.250000617, 1.202041029), (-6.000000617, 1.202041029))
            Line((-6.000000617, 1.202041029), (-6.000000617, 11))
            Line((-6.000000617, 11), (-17.250000617, 11))
            ThreePointArc((-17.250000617, 11), (-21.250000617, 6.101020514), (-17.250000617, 1.202041029))
        make_face()
        with Locations((-16.250000617, 6.101020514)):
            Circle(SKETCH2_R, mode=Mode.SUBTRACT)
    boss_extrude2 = extrude(amount=-BOSS_EXTRUDE2_DEPTH)

    # LPattern1: Boss-Extrude2 ×6
    with Locations(*[(-i * LPATTERN1_PITCH, 0, 0) for i in range(1, LPATTERN1_COUNT)]):
        add(boss_extrude2)

    # Sketch3 → Boss-Extrude3 (add)
    with BuildSketch(Plane.ZY.offset(60)):
        with BuildLine():
            Line((17.24, -1.202041029), (12.5, -1.202041029))
            Line((12.5, -1.202041029), (12.5, -2.238356932))
            ThreePointArc((12.5, -2.238356932), (11.24, -6.005), (12.5, -9.771643068))
            Line((12.5, -9.771643068), (12.5, -11))
            Line((12.5, -11), (17.24, -11))
            ThreePointArc((17.24, -11), (21.24, -6.101020514), (17.24, -1.202041029))
        make_face()
        with Locations((16.24, -6.101020514)):
            Circle(SKETCH3_R, mode=Mode.SUBTRACT)
    boss_extrude3 = extrude(amount=-BOSS_EXTRUDE3_DEPTH)

    # LPattern2: Boss-Extrude3 ×6
    with Locations(*[(i * LPATTERN2_PITCH, 0, 0) for i in range(1, LPATTERN2_COUNT)]):
        add(boss_extrude3)

    # Sketch4 → Cut-Extrude1 (cut)
    with BuildSketch(Plane(origin=(0, 0, -12.5), x_dir=(-1, 0, 0), z_dir=(0, 0, -1))):
        with Locations(Location((0, 0, 0), (0, 0, 90))):
            Circle(SKETCH4_R)
    extrude(amount=-CUT_EXTRUDE1_DEPTH, mode=Mode.SUBTRACT)


solid = part.part
